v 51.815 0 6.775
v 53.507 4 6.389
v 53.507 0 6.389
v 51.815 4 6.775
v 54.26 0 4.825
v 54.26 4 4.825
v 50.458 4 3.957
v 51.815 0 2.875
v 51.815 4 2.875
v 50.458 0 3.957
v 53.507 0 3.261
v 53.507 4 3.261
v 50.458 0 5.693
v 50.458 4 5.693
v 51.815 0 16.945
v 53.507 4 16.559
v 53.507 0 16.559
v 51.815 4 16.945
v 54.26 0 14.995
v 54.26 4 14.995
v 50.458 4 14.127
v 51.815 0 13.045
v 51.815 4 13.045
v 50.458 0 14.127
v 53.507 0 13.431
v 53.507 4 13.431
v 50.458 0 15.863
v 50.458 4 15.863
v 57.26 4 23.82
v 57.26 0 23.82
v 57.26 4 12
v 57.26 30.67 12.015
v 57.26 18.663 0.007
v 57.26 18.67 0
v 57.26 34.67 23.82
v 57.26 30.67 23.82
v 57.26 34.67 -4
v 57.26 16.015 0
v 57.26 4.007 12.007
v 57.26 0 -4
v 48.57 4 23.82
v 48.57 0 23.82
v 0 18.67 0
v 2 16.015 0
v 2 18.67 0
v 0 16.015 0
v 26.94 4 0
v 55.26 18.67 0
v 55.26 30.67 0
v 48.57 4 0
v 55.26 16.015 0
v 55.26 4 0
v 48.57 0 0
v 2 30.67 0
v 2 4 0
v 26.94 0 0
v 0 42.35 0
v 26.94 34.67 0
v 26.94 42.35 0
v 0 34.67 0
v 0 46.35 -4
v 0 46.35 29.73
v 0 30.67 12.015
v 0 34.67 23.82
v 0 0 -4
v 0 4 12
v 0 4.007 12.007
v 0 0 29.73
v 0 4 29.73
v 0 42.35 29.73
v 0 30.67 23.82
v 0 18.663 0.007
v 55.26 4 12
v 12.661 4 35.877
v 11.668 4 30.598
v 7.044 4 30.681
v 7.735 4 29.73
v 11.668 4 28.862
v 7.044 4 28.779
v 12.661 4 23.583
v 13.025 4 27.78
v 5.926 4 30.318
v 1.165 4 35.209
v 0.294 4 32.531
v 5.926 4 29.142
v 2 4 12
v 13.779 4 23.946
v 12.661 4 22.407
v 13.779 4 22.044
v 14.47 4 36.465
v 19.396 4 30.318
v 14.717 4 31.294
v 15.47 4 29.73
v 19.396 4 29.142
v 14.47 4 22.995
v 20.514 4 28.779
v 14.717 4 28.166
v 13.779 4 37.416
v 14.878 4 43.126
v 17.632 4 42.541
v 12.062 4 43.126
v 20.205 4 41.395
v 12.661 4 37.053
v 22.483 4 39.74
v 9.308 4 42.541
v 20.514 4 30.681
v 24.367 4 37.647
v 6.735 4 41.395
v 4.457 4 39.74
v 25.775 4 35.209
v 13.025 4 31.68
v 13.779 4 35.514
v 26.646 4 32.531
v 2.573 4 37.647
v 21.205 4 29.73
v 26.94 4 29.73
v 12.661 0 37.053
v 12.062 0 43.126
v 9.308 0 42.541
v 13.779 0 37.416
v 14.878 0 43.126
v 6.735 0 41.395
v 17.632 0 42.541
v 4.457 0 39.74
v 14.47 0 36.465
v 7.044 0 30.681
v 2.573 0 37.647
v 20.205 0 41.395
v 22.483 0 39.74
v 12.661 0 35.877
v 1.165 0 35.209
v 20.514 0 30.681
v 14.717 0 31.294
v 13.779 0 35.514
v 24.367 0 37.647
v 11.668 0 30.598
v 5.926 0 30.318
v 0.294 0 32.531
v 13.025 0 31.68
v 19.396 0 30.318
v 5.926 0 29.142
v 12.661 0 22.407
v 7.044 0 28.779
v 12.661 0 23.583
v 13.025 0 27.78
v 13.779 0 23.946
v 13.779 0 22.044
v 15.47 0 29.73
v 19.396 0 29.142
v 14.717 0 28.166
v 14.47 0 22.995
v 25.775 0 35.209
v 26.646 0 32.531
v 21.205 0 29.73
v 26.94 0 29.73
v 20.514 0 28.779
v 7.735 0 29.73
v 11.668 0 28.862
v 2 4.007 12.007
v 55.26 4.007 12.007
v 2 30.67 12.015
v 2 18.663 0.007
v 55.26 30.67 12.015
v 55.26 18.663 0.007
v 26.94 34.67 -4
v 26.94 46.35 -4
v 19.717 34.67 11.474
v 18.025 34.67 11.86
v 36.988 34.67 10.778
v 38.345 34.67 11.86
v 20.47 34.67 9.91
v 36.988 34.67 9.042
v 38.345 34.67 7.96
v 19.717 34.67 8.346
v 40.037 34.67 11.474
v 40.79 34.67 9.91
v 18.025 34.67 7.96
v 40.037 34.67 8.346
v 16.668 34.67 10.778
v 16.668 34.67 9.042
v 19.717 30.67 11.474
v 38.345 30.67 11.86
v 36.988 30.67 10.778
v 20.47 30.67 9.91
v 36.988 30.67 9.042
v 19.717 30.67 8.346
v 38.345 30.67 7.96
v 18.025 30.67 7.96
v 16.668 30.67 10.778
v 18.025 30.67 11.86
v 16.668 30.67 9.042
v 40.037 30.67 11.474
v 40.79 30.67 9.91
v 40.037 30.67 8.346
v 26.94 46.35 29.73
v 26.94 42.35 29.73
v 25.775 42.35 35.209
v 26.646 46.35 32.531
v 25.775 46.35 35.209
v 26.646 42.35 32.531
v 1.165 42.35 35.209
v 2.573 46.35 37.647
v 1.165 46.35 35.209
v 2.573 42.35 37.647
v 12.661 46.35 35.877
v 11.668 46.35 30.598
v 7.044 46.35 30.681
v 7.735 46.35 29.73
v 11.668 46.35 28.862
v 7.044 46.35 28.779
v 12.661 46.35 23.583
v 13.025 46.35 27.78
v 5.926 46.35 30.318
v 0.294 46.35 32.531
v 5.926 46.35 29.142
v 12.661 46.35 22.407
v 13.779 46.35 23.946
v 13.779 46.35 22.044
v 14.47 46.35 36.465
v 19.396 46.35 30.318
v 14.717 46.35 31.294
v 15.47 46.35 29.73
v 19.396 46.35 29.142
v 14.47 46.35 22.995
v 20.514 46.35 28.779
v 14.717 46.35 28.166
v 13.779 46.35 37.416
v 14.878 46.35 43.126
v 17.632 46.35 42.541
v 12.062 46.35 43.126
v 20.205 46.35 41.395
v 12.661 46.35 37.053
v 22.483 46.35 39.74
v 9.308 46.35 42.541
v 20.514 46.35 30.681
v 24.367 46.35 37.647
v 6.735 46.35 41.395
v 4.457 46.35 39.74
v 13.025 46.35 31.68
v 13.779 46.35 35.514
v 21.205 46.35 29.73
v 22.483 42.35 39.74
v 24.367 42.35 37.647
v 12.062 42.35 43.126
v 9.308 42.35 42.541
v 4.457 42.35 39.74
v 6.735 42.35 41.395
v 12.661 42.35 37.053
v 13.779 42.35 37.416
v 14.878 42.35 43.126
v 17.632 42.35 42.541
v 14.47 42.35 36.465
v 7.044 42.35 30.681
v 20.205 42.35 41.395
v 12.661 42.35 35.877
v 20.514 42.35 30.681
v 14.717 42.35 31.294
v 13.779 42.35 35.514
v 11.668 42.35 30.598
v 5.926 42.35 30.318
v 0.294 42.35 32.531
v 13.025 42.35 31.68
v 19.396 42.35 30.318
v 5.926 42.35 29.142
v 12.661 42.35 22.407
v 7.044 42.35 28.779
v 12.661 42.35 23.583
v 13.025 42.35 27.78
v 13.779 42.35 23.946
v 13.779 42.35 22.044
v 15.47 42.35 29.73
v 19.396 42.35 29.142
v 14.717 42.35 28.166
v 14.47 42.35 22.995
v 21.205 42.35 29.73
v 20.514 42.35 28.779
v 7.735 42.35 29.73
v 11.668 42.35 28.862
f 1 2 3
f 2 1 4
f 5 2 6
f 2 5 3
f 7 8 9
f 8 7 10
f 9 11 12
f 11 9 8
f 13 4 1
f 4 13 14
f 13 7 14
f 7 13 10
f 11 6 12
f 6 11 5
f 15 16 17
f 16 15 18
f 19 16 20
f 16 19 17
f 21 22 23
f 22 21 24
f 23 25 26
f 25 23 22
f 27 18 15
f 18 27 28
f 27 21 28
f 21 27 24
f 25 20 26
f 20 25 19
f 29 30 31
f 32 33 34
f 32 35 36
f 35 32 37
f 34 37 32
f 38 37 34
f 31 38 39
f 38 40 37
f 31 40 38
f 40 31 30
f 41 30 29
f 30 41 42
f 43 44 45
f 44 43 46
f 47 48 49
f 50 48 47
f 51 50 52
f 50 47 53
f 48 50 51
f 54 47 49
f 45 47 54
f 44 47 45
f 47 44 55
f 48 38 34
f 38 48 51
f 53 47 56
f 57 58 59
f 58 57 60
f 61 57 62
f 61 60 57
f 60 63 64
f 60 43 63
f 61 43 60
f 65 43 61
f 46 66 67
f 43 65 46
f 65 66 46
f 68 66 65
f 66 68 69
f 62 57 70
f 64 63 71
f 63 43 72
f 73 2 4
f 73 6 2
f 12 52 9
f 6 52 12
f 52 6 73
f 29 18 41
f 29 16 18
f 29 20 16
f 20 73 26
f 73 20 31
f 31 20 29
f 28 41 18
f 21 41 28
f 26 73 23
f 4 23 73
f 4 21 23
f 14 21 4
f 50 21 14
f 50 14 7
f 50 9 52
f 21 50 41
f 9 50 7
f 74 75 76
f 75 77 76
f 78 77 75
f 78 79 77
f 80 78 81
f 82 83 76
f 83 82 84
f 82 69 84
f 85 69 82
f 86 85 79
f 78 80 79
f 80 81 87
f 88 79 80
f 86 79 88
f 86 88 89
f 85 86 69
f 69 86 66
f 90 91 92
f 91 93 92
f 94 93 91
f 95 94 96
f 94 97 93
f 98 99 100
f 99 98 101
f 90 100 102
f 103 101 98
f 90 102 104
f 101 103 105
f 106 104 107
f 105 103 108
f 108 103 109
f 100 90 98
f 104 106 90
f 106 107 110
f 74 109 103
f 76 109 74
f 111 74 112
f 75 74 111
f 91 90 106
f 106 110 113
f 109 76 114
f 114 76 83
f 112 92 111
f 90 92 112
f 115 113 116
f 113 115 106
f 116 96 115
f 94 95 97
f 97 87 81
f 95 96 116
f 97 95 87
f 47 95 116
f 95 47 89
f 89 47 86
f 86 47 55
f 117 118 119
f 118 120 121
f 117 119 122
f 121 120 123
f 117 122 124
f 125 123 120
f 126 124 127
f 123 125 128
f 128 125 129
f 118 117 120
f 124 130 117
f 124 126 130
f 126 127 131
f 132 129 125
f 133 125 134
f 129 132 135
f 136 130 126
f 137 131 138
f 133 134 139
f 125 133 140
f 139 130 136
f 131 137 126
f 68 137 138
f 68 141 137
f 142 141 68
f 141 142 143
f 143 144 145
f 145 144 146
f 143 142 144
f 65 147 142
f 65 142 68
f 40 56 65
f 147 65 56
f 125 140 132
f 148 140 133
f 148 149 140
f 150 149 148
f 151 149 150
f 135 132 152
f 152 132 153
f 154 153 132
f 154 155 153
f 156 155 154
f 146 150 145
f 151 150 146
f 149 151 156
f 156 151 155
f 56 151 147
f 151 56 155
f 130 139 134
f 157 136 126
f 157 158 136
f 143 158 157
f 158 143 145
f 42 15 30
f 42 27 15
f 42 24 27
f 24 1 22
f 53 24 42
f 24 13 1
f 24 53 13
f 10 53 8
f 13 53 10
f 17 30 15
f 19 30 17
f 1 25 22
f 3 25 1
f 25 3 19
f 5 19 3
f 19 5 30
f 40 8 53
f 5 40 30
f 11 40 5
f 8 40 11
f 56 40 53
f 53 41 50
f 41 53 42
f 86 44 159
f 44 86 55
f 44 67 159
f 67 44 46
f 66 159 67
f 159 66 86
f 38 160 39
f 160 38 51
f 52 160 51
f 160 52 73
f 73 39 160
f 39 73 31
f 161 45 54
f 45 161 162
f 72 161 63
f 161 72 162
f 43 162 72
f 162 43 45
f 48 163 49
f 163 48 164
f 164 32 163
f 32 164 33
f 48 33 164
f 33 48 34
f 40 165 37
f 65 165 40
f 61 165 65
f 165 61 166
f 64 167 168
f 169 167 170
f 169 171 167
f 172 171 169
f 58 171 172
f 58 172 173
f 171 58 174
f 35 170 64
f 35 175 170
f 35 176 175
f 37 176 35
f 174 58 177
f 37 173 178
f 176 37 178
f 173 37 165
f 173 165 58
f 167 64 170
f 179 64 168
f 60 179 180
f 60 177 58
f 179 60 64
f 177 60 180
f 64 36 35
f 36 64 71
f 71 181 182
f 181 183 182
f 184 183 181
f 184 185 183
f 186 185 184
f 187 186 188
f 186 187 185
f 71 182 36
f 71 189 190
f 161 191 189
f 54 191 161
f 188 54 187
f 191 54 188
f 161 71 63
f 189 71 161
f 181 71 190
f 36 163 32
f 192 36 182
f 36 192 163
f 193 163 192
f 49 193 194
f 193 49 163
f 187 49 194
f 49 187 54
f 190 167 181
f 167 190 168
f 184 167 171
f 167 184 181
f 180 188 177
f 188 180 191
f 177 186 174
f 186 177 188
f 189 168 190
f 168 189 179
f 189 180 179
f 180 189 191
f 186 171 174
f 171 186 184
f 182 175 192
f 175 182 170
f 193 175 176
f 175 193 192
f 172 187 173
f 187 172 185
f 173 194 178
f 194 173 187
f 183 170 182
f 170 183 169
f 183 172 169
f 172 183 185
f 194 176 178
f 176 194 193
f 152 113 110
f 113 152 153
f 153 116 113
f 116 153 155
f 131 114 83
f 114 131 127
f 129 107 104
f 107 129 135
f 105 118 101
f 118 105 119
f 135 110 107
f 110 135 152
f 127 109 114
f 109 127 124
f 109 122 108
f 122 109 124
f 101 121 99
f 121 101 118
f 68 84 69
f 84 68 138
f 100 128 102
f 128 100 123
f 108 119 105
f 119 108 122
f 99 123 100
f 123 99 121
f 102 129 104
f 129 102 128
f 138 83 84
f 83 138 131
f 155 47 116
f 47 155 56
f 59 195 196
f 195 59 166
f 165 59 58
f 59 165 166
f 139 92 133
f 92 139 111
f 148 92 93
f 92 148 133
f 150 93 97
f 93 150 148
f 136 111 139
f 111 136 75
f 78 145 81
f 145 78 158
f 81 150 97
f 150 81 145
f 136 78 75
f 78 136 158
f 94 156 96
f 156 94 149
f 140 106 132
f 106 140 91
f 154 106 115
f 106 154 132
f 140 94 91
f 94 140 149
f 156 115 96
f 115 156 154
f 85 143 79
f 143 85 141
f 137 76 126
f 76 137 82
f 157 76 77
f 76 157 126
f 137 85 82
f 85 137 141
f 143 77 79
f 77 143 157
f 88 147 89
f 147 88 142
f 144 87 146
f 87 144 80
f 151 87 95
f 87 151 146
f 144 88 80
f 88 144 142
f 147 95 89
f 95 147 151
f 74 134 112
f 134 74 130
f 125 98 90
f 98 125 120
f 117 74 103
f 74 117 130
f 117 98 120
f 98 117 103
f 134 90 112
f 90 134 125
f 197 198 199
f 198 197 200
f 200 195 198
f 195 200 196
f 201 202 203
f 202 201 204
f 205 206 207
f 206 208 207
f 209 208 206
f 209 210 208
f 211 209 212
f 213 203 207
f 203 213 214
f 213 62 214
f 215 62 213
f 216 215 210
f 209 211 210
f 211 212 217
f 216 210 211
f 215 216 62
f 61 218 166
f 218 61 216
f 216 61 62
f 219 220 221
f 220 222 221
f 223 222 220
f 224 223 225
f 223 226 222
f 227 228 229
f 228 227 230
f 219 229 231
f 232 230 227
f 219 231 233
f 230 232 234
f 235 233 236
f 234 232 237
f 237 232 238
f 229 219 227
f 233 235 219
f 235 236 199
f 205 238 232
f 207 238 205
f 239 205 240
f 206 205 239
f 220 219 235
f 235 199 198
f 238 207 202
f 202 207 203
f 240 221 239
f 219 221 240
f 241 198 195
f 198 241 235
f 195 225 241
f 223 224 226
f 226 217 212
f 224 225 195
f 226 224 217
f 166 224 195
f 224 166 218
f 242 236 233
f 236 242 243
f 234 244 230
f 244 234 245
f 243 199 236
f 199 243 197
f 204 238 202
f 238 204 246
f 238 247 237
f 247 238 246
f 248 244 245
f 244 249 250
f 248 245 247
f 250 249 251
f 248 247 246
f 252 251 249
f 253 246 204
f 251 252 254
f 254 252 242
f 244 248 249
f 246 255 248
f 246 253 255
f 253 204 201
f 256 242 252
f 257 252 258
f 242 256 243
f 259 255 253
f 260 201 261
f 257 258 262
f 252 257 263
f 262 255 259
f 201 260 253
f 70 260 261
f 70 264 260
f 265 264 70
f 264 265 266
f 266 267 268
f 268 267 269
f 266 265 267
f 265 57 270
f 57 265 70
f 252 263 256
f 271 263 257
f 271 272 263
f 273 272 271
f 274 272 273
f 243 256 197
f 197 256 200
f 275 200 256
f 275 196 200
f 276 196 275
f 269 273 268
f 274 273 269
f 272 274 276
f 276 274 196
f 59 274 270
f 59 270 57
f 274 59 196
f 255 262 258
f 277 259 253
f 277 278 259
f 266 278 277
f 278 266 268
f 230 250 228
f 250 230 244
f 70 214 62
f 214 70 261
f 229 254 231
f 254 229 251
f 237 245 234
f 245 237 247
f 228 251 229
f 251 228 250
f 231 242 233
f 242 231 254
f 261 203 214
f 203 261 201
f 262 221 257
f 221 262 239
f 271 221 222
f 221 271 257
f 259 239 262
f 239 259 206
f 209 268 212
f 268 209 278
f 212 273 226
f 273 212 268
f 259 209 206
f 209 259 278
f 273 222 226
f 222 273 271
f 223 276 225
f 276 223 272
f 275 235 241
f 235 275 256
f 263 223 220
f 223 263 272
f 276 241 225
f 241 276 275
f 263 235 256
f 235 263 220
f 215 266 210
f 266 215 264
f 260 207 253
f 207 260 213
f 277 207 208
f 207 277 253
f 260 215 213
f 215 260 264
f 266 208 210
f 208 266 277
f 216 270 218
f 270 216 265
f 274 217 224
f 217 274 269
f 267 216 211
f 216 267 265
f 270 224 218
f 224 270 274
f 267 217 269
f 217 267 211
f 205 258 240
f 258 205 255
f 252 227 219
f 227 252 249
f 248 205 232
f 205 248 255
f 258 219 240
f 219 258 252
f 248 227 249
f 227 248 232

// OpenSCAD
module servo_bracket()
{

A = 19.82;
B = 13.47;
C = 33.79;
D = 10.17;
E = 9.66;
F = 30.22;
G = 11.68;
H = 26.67;
J = 52.84;

thickness = 4;

module pinhole( x, y, z ){
	translate([x,y,z]){
		rotate(90,[1,0,0]){
			cylinder(h=thickness+2,r=1);
		}
	}
}

module pivothole( x, y, z ){
	translate([x,y,z]){
		rotate(90,[1,0,0]){
			cylinder(h=thickness+2,r=2);
		}
	}
}

module mountpoint( x, y, z ){
		//one pivot hole in the center
		pivothole( x, y, z );

		//four mount holes
		pinhole( x+(B/2), y, z );
		pinhole( x-(B/2), y, z );
		pinhole( x, y, z-(B/2) );
		pinhole( x, y, z+(B/2) );
}

	//zero ball
	//sphere(r=1);

	//front plate
	//sanity check ball
	//translate( [ 0, 0, A ] ){
	//	sphere(r=1);
	//}
	difference(){
		cube( size=[ B+C+10, thickness, A+thickness ] );
		translate( [ ((B+C+10)-(E+F))/2, -1, 0] ){
			cube( size=[ E+F, thickness+2, A+5 ] );
		}

		translate( [ 0, thickness+1, 0] ){
			//four mounting holes
			pivothole( 5, 0, (A-D)/2 );
			pivothole( 5, 0, ((A-D)/2)+D );
			pivothole( B+C+5, 0, (A-D)/2 );
			pivothole( B+C+5, 0, ((A-D)/2)+D );
		}
	}

	//supports
	difference(){
		union(){
			translate( [ 0, -3, 5 ] ){
				rotate( -45, [1,0,0] ){
					cube( size=[ thickness/2 , H/1.5, A/2 ] );
				}
			}
			translate( [ (B+C+10)-(thickness/2), -3, 5 ] ){
				rotate( -45, [1,0,0] ){
					cube( size=[ thickness/2 , H/1.5, A/2 ] );
				}
			}
			translate( [ 0, H-1, -7 ] ){
				rotate( 45, [1,0,0] ){
					cube( size=[ thickness/2 , H/1.5, A/2 ] );
				}
			}
			translate( [ (B+C+10)-(thickness/2), H-1, -7 ] ){
				rotate( 45, [1,0,0] ){
					cube( size=[ thickness/2 , H/1.5, A/2 ] );
				}
			}
		}
		union(){
			translate( [ 0, 0, -thickness*2 ] ){
				cube( size=[ B+C+10, H+(thickness*2), thickness ] );
			}
			translate( [ 0, -thickness, 0 ] ){
				cube( size=[ B+C+10, thickness, A+thickness ] );
			}
			translate( [ 0, H+thickness*2, 0 ] ){
				cube( size=[ B+C+10, thickness, A+thickness ] );
			}
		}
	}

	//back plate
	//sanity check ball
	//translate( [ 0, H, 0] ){
	//	sphere(r=1);
	//}
	difference(){
		translate( [0, H+thickness, 0] ){
			cube( size=[ B+C+10, thickness, A+thickness ] );
		}

		//pivot holes behind servo
		pivothole( B+5, H+(thickness*2)+1, A/2 );
		pivothole( (B+C+10)-(B+5), H+(thickness*2)+1, A/2 );
	}

	//base
	translate( [ 0, 0, -thickness ] ){
		cube( size=[ B+C+10, H+(thickness*2), thickness ] );
	}
}


module servo_bracket_C()
{

A = 19.82;
B = 13.47;
C = 33.79;
D = 10.17;
E = 9.66;
F = 30.22;
G = 11.68;
H = 26.67;
J = 52.84;

thickness = 4;

module pinhole( x, y, z ){
	translate([x,y,z]){
		rotate(90,[1,0,0]){
			cylinder(h=thickness+2,r=1);
		}
	}
}

module pivothole( x, y, z ){
	translate([x,y,z]){
		rotate(90,[1,0,0]){
			cylinder(h=thickness+2,r=2);
		}
	}
}

module mountpoint( x, y, z ){
		//one pivot hole in the center
		pivothole( x, y, z );

		//four mount holes
		pinhole( x+(B/2), y, z );
		pinhole( x-(B/2), y, z );
		pinhole( x, y, z-(B/2) );
		pinhole( x, y, z+(B/2) );
}

	//zero ball
	//sphere(r=1);

	//front plate
	difference(){
		union(){
			translate( [ B, thickness, A*1.5 ] ){
				rotate( 90, [ 1, 0, 0 ] ){
					cylinder( h=thickness, r=B );
				}
			}
			cube( size=[ B*2, thickness, A*1.5 ] );
		}

		mountpoint( B, thickness+1, A*1.5 );
	}

	//back plate
	//sanity check ball
	//translate( [ 0, H+G, 0 ] ){
	//	sphere(r=1);
	//}
	difference(){
		union(){
			translate( [ B, H+G+(thickness*2), A*1.5 ] ){
				rotate( 90, [ 1, 0, 0 ] ){
					cylinder( h=thickness, r=B );
				}
			}
			translate( [ 0, H+G+thickness, 0 ] ){
				cube( size=[ B*2, thickness, A*1.5 ] );
			}
		}

		//mount point behind servo
		mountpoint( B, H+G+(thickness*2)+1, A*1.5 );
	}

	//base
	difference(){
		translate( [ 0, 0, -thickness ] ){
			cube( size=[ B*2, H+G+(thickness*2), thickness ] );
		}
		rotate( 90, [ 1, 0, 0 ] ){
			mountpoint( B, 1, -(H+G+(thickness*2))/2 );
		}
	}
}



servo_bracket();

servo_bracket_C();
